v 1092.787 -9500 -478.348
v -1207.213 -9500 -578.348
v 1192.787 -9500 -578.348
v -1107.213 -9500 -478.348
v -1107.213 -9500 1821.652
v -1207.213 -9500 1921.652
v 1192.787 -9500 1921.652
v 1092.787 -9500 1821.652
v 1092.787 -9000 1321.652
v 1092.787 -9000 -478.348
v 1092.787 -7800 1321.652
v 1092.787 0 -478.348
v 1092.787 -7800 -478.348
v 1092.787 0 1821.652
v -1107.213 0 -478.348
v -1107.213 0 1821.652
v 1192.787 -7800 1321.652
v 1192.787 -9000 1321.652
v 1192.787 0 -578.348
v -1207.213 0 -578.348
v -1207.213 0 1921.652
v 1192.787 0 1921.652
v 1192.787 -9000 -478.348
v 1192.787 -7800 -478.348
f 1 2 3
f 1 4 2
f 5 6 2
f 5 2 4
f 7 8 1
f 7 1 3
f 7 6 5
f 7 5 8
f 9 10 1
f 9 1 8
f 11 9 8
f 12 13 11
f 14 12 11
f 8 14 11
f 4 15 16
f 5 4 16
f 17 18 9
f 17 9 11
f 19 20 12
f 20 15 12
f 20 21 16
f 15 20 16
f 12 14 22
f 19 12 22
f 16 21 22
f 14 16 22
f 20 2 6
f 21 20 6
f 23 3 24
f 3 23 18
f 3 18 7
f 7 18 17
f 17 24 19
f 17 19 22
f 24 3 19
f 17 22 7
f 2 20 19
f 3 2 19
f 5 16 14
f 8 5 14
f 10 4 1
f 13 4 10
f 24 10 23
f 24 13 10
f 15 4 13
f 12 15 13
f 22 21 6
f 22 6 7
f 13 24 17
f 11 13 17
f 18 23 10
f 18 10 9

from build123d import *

# Parameters (mm, degrees)
F0_W     = 2400
F0_H     = 2500
F0_W_2   = 2200
F0_H_2   = 2300
F1_DEPTH = 9500
F2_W     = 1200
F2_H     = 1800
F3_DEPTH = 100


with BuildPart() as f1:
    # F0 (on Front) → F1 (new body)
    with BuildSketch(Plane.XZ):
        with Locations((-7.212618, 671.652154)):
            Rectangle(F0_W, F0_H)
        with Locations((-7.212618, 671.652154)):
            Rectangle(F0_W_2, F0_H_2, mode=Mode.SUBTRACT)
    extrude(amount=F1_DEPTH)

    # F2 (on face) → F3 (cut)
    with BuildSketch(Plane.YZ.offset(1192.787382)):
        with Locations((-8400, 421.652154)):
            Rectangle(F2_W, F2_H)
    extrude(amount=-F3_DEPTH, mode=Mode.SUBTRACT)


solid = f1.part
